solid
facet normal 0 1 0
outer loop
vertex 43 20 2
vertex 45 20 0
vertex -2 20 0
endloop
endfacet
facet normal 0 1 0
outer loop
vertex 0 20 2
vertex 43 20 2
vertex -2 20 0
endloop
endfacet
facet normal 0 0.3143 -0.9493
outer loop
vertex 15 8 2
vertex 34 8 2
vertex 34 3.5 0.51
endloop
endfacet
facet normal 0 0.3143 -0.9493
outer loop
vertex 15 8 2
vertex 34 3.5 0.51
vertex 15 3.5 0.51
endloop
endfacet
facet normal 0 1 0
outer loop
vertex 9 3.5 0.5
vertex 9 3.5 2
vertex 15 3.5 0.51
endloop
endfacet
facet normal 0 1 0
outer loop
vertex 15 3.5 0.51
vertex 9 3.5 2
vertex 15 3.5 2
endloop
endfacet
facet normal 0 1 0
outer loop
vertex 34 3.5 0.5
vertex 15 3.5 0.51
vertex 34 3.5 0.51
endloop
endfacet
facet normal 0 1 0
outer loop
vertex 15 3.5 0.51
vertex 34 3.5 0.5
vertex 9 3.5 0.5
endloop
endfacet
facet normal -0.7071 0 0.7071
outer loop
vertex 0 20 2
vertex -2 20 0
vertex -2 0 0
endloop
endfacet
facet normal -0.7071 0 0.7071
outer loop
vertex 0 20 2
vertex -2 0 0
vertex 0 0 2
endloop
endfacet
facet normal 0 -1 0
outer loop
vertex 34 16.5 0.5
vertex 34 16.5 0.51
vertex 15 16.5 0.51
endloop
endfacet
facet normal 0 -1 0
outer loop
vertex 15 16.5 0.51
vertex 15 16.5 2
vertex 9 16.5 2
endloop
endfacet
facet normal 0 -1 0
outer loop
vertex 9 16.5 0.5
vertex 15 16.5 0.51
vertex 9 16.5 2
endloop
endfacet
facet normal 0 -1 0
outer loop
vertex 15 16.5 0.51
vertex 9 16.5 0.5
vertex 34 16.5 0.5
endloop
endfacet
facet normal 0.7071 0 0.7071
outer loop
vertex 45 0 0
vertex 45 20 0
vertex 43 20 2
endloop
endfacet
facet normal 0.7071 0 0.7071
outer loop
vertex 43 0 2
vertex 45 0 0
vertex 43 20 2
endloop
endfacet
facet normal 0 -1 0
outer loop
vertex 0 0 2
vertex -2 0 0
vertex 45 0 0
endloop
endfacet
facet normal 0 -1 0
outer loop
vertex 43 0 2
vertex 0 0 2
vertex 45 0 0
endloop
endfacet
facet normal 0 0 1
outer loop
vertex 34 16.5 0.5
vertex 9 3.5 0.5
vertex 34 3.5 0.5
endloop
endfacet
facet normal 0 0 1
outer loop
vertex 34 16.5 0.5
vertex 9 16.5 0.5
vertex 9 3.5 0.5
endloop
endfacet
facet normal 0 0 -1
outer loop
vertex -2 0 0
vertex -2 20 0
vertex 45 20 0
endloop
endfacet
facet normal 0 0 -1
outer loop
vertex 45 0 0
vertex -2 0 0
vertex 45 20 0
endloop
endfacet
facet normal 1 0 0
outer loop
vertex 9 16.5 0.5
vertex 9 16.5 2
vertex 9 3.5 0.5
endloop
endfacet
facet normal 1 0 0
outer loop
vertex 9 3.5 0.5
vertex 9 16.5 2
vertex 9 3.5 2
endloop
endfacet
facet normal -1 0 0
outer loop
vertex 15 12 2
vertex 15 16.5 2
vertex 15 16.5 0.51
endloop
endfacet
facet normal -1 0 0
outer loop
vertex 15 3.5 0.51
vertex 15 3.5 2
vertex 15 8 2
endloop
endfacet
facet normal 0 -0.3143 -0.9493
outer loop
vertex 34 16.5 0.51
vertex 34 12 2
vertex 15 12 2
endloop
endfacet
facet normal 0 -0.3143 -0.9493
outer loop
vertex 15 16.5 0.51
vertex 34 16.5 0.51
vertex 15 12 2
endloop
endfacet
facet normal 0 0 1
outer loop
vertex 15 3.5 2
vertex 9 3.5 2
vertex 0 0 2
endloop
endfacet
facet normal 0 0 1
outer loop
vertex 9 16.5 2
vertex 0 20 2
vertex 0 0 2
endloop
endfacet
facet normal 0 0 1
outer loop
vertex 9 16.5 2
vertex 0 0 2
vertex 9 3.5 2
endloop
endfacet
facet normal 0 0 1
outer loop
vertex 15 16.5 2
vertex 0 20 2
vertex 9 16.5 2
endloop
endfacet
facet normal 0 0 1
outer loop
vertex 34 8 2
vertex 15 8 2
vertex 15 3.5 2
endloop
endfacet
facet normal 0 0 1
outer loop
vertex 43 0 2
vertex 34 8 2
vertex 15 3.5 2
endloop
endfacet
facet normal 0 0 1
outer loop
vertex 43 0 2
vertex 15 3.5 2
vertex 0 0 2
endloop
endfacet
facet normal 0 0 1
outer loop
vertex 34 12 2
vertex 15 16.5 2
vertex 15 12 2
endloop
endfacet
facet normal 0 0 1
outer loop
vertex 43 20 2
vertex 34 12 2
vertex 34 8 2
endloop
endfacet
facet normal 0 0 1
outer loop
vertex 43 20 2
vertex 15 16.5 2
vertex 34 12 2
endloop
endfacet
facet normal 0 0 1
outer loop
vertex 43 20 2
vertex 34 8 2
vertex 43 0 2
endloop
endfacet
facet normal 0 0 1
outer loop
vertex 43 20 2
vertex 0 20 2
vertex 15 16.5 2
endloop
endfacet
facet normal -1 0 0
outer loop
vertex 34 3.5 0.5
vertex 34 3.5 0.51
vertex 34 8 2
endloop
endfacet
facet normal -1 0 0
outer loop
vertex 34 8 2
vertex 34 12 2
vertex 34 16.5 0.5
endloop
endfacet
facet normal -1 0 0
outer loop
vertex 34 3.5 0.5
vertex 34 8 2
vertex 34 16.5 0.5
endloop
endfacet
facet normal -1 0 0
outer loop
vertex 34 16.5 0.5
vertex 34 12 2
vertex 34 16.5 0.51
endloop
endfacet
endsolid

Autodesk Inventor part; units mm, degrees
ref_plane "YZ Plane" through (0, 0, 0) normal (1, 0, 0) x (0, 1, 0)
ref_plane "XZ Plane" through (0, 0, 0) normal (0, 1, 0) x (-1, 0, 0)
ref_plane "XY Plane" through (0, 0, 0) normal (0, 0, 1) x (1, 0, 0)
sketch "Sketch1" plane through (0, 0, 0) normal (0, 0, 1) x (1, 0, 0)
  line L0 (0, 0) -> (43, 0)
  line L1 (43, 0) -> (43, 20)
  line L2 (43, 20) -> (0, 20)
  line L3 (0, 20) -> (0, 0)
  dimension "d0" = 43
  dimension "d1" = 20
extrude "Extrusion1" add sketch "Sketch1" along normal blind 2
sketch "Sketch2" plane through (0, 0, 0) normal (0, -1, 0) x (1, 0, 0)
  line L0 (43, 0) -> (43, 2) projected
  line L1 (0, 0) -> (0, 2) projected
  line L2 (0, 0) -> (-2, 0)
  line L3 (-2, 0) -> (0, 2)
  line L4 (43, 0) -> (45, 0)
  line L5 (45, 0) -> (43, 2)
  dimension "d4" = 2
  dimension "d5" = 2
extrude "Extrusion2" add sketch "Sketch2" against normal blind 20
sketch "Sketch3" plane through (0, 0, 2) normal (0, 0, 1) x (1, 0, 0)
  line L0 (0, 0) -> (43, 0) projected
  line L1 (43, 0) -> (43, 20) projected
  line L2 (43, 20) -> (0, 20) projected
  line L3 (0, 20) -> (0, 0) projected
  line L4 (9, 3.5) -> (34, 3.5)
  line L5 (34, 3.5) -> (34, 16.5)
  line L6 (34, 16.5) -> (9, 16.5)
  line L7 (9, 16.5) -> (9, 3.5)
  dimension "d8" = 25
  dimension "d9" = 13
  dimension "d10" = 3.5
  dimension "d11" = 3.5
  dimension "d12" = 9
  dimension "d13" = 9
extrude "Extrusion3" cut sketch "Sketch3" against normal blind 1.5 contours L7 L6 L5 L4
sketch "Sketch4" plane through (0, 0, 2) normal (0, 0, 1) x (1, 0, 0)
  line L0 (34, 16.5) -> (34, 3.5) projected
  line L1 (34, 3.5) -> (15, 3.5)
  line L2 (15, 3.5) -> (15, 8)
  line L3 (15, 8) -> (34, 8)
  line L4 (34, 8) -> (34, 3.5)
  line L5 (9, 16.5) -> (34, 16.5) projected
  line L6 (34, 16.5) -> (15, 16.5)
  line L7 (15, 16.5) -> (15, 12)
  line L8 (15, 12) -> (34, 12)
  line L9 (34, 12) -> (34, 16.5)
  dimension "d16" = 19
  dimension "d17" = 4.5
  dimension "d18" = 4.5
extrude "Extrusion4" add sketch "Sketch4" against normal blind 1.49
chamfer "Chamfer5" distance 4.5 distance2 1.49 1 edges at (24.5, 12, 0.51) measured on face at (21.3333, 15, 0.51)
chamfer "Chamfer6" distance 4.5 distance2 1.49 1 edges at (24.5, 8, 0.51) measured on face at (27.6667, 5, 0.51)
properties part number "deksel token Nieuw bevestiging"
